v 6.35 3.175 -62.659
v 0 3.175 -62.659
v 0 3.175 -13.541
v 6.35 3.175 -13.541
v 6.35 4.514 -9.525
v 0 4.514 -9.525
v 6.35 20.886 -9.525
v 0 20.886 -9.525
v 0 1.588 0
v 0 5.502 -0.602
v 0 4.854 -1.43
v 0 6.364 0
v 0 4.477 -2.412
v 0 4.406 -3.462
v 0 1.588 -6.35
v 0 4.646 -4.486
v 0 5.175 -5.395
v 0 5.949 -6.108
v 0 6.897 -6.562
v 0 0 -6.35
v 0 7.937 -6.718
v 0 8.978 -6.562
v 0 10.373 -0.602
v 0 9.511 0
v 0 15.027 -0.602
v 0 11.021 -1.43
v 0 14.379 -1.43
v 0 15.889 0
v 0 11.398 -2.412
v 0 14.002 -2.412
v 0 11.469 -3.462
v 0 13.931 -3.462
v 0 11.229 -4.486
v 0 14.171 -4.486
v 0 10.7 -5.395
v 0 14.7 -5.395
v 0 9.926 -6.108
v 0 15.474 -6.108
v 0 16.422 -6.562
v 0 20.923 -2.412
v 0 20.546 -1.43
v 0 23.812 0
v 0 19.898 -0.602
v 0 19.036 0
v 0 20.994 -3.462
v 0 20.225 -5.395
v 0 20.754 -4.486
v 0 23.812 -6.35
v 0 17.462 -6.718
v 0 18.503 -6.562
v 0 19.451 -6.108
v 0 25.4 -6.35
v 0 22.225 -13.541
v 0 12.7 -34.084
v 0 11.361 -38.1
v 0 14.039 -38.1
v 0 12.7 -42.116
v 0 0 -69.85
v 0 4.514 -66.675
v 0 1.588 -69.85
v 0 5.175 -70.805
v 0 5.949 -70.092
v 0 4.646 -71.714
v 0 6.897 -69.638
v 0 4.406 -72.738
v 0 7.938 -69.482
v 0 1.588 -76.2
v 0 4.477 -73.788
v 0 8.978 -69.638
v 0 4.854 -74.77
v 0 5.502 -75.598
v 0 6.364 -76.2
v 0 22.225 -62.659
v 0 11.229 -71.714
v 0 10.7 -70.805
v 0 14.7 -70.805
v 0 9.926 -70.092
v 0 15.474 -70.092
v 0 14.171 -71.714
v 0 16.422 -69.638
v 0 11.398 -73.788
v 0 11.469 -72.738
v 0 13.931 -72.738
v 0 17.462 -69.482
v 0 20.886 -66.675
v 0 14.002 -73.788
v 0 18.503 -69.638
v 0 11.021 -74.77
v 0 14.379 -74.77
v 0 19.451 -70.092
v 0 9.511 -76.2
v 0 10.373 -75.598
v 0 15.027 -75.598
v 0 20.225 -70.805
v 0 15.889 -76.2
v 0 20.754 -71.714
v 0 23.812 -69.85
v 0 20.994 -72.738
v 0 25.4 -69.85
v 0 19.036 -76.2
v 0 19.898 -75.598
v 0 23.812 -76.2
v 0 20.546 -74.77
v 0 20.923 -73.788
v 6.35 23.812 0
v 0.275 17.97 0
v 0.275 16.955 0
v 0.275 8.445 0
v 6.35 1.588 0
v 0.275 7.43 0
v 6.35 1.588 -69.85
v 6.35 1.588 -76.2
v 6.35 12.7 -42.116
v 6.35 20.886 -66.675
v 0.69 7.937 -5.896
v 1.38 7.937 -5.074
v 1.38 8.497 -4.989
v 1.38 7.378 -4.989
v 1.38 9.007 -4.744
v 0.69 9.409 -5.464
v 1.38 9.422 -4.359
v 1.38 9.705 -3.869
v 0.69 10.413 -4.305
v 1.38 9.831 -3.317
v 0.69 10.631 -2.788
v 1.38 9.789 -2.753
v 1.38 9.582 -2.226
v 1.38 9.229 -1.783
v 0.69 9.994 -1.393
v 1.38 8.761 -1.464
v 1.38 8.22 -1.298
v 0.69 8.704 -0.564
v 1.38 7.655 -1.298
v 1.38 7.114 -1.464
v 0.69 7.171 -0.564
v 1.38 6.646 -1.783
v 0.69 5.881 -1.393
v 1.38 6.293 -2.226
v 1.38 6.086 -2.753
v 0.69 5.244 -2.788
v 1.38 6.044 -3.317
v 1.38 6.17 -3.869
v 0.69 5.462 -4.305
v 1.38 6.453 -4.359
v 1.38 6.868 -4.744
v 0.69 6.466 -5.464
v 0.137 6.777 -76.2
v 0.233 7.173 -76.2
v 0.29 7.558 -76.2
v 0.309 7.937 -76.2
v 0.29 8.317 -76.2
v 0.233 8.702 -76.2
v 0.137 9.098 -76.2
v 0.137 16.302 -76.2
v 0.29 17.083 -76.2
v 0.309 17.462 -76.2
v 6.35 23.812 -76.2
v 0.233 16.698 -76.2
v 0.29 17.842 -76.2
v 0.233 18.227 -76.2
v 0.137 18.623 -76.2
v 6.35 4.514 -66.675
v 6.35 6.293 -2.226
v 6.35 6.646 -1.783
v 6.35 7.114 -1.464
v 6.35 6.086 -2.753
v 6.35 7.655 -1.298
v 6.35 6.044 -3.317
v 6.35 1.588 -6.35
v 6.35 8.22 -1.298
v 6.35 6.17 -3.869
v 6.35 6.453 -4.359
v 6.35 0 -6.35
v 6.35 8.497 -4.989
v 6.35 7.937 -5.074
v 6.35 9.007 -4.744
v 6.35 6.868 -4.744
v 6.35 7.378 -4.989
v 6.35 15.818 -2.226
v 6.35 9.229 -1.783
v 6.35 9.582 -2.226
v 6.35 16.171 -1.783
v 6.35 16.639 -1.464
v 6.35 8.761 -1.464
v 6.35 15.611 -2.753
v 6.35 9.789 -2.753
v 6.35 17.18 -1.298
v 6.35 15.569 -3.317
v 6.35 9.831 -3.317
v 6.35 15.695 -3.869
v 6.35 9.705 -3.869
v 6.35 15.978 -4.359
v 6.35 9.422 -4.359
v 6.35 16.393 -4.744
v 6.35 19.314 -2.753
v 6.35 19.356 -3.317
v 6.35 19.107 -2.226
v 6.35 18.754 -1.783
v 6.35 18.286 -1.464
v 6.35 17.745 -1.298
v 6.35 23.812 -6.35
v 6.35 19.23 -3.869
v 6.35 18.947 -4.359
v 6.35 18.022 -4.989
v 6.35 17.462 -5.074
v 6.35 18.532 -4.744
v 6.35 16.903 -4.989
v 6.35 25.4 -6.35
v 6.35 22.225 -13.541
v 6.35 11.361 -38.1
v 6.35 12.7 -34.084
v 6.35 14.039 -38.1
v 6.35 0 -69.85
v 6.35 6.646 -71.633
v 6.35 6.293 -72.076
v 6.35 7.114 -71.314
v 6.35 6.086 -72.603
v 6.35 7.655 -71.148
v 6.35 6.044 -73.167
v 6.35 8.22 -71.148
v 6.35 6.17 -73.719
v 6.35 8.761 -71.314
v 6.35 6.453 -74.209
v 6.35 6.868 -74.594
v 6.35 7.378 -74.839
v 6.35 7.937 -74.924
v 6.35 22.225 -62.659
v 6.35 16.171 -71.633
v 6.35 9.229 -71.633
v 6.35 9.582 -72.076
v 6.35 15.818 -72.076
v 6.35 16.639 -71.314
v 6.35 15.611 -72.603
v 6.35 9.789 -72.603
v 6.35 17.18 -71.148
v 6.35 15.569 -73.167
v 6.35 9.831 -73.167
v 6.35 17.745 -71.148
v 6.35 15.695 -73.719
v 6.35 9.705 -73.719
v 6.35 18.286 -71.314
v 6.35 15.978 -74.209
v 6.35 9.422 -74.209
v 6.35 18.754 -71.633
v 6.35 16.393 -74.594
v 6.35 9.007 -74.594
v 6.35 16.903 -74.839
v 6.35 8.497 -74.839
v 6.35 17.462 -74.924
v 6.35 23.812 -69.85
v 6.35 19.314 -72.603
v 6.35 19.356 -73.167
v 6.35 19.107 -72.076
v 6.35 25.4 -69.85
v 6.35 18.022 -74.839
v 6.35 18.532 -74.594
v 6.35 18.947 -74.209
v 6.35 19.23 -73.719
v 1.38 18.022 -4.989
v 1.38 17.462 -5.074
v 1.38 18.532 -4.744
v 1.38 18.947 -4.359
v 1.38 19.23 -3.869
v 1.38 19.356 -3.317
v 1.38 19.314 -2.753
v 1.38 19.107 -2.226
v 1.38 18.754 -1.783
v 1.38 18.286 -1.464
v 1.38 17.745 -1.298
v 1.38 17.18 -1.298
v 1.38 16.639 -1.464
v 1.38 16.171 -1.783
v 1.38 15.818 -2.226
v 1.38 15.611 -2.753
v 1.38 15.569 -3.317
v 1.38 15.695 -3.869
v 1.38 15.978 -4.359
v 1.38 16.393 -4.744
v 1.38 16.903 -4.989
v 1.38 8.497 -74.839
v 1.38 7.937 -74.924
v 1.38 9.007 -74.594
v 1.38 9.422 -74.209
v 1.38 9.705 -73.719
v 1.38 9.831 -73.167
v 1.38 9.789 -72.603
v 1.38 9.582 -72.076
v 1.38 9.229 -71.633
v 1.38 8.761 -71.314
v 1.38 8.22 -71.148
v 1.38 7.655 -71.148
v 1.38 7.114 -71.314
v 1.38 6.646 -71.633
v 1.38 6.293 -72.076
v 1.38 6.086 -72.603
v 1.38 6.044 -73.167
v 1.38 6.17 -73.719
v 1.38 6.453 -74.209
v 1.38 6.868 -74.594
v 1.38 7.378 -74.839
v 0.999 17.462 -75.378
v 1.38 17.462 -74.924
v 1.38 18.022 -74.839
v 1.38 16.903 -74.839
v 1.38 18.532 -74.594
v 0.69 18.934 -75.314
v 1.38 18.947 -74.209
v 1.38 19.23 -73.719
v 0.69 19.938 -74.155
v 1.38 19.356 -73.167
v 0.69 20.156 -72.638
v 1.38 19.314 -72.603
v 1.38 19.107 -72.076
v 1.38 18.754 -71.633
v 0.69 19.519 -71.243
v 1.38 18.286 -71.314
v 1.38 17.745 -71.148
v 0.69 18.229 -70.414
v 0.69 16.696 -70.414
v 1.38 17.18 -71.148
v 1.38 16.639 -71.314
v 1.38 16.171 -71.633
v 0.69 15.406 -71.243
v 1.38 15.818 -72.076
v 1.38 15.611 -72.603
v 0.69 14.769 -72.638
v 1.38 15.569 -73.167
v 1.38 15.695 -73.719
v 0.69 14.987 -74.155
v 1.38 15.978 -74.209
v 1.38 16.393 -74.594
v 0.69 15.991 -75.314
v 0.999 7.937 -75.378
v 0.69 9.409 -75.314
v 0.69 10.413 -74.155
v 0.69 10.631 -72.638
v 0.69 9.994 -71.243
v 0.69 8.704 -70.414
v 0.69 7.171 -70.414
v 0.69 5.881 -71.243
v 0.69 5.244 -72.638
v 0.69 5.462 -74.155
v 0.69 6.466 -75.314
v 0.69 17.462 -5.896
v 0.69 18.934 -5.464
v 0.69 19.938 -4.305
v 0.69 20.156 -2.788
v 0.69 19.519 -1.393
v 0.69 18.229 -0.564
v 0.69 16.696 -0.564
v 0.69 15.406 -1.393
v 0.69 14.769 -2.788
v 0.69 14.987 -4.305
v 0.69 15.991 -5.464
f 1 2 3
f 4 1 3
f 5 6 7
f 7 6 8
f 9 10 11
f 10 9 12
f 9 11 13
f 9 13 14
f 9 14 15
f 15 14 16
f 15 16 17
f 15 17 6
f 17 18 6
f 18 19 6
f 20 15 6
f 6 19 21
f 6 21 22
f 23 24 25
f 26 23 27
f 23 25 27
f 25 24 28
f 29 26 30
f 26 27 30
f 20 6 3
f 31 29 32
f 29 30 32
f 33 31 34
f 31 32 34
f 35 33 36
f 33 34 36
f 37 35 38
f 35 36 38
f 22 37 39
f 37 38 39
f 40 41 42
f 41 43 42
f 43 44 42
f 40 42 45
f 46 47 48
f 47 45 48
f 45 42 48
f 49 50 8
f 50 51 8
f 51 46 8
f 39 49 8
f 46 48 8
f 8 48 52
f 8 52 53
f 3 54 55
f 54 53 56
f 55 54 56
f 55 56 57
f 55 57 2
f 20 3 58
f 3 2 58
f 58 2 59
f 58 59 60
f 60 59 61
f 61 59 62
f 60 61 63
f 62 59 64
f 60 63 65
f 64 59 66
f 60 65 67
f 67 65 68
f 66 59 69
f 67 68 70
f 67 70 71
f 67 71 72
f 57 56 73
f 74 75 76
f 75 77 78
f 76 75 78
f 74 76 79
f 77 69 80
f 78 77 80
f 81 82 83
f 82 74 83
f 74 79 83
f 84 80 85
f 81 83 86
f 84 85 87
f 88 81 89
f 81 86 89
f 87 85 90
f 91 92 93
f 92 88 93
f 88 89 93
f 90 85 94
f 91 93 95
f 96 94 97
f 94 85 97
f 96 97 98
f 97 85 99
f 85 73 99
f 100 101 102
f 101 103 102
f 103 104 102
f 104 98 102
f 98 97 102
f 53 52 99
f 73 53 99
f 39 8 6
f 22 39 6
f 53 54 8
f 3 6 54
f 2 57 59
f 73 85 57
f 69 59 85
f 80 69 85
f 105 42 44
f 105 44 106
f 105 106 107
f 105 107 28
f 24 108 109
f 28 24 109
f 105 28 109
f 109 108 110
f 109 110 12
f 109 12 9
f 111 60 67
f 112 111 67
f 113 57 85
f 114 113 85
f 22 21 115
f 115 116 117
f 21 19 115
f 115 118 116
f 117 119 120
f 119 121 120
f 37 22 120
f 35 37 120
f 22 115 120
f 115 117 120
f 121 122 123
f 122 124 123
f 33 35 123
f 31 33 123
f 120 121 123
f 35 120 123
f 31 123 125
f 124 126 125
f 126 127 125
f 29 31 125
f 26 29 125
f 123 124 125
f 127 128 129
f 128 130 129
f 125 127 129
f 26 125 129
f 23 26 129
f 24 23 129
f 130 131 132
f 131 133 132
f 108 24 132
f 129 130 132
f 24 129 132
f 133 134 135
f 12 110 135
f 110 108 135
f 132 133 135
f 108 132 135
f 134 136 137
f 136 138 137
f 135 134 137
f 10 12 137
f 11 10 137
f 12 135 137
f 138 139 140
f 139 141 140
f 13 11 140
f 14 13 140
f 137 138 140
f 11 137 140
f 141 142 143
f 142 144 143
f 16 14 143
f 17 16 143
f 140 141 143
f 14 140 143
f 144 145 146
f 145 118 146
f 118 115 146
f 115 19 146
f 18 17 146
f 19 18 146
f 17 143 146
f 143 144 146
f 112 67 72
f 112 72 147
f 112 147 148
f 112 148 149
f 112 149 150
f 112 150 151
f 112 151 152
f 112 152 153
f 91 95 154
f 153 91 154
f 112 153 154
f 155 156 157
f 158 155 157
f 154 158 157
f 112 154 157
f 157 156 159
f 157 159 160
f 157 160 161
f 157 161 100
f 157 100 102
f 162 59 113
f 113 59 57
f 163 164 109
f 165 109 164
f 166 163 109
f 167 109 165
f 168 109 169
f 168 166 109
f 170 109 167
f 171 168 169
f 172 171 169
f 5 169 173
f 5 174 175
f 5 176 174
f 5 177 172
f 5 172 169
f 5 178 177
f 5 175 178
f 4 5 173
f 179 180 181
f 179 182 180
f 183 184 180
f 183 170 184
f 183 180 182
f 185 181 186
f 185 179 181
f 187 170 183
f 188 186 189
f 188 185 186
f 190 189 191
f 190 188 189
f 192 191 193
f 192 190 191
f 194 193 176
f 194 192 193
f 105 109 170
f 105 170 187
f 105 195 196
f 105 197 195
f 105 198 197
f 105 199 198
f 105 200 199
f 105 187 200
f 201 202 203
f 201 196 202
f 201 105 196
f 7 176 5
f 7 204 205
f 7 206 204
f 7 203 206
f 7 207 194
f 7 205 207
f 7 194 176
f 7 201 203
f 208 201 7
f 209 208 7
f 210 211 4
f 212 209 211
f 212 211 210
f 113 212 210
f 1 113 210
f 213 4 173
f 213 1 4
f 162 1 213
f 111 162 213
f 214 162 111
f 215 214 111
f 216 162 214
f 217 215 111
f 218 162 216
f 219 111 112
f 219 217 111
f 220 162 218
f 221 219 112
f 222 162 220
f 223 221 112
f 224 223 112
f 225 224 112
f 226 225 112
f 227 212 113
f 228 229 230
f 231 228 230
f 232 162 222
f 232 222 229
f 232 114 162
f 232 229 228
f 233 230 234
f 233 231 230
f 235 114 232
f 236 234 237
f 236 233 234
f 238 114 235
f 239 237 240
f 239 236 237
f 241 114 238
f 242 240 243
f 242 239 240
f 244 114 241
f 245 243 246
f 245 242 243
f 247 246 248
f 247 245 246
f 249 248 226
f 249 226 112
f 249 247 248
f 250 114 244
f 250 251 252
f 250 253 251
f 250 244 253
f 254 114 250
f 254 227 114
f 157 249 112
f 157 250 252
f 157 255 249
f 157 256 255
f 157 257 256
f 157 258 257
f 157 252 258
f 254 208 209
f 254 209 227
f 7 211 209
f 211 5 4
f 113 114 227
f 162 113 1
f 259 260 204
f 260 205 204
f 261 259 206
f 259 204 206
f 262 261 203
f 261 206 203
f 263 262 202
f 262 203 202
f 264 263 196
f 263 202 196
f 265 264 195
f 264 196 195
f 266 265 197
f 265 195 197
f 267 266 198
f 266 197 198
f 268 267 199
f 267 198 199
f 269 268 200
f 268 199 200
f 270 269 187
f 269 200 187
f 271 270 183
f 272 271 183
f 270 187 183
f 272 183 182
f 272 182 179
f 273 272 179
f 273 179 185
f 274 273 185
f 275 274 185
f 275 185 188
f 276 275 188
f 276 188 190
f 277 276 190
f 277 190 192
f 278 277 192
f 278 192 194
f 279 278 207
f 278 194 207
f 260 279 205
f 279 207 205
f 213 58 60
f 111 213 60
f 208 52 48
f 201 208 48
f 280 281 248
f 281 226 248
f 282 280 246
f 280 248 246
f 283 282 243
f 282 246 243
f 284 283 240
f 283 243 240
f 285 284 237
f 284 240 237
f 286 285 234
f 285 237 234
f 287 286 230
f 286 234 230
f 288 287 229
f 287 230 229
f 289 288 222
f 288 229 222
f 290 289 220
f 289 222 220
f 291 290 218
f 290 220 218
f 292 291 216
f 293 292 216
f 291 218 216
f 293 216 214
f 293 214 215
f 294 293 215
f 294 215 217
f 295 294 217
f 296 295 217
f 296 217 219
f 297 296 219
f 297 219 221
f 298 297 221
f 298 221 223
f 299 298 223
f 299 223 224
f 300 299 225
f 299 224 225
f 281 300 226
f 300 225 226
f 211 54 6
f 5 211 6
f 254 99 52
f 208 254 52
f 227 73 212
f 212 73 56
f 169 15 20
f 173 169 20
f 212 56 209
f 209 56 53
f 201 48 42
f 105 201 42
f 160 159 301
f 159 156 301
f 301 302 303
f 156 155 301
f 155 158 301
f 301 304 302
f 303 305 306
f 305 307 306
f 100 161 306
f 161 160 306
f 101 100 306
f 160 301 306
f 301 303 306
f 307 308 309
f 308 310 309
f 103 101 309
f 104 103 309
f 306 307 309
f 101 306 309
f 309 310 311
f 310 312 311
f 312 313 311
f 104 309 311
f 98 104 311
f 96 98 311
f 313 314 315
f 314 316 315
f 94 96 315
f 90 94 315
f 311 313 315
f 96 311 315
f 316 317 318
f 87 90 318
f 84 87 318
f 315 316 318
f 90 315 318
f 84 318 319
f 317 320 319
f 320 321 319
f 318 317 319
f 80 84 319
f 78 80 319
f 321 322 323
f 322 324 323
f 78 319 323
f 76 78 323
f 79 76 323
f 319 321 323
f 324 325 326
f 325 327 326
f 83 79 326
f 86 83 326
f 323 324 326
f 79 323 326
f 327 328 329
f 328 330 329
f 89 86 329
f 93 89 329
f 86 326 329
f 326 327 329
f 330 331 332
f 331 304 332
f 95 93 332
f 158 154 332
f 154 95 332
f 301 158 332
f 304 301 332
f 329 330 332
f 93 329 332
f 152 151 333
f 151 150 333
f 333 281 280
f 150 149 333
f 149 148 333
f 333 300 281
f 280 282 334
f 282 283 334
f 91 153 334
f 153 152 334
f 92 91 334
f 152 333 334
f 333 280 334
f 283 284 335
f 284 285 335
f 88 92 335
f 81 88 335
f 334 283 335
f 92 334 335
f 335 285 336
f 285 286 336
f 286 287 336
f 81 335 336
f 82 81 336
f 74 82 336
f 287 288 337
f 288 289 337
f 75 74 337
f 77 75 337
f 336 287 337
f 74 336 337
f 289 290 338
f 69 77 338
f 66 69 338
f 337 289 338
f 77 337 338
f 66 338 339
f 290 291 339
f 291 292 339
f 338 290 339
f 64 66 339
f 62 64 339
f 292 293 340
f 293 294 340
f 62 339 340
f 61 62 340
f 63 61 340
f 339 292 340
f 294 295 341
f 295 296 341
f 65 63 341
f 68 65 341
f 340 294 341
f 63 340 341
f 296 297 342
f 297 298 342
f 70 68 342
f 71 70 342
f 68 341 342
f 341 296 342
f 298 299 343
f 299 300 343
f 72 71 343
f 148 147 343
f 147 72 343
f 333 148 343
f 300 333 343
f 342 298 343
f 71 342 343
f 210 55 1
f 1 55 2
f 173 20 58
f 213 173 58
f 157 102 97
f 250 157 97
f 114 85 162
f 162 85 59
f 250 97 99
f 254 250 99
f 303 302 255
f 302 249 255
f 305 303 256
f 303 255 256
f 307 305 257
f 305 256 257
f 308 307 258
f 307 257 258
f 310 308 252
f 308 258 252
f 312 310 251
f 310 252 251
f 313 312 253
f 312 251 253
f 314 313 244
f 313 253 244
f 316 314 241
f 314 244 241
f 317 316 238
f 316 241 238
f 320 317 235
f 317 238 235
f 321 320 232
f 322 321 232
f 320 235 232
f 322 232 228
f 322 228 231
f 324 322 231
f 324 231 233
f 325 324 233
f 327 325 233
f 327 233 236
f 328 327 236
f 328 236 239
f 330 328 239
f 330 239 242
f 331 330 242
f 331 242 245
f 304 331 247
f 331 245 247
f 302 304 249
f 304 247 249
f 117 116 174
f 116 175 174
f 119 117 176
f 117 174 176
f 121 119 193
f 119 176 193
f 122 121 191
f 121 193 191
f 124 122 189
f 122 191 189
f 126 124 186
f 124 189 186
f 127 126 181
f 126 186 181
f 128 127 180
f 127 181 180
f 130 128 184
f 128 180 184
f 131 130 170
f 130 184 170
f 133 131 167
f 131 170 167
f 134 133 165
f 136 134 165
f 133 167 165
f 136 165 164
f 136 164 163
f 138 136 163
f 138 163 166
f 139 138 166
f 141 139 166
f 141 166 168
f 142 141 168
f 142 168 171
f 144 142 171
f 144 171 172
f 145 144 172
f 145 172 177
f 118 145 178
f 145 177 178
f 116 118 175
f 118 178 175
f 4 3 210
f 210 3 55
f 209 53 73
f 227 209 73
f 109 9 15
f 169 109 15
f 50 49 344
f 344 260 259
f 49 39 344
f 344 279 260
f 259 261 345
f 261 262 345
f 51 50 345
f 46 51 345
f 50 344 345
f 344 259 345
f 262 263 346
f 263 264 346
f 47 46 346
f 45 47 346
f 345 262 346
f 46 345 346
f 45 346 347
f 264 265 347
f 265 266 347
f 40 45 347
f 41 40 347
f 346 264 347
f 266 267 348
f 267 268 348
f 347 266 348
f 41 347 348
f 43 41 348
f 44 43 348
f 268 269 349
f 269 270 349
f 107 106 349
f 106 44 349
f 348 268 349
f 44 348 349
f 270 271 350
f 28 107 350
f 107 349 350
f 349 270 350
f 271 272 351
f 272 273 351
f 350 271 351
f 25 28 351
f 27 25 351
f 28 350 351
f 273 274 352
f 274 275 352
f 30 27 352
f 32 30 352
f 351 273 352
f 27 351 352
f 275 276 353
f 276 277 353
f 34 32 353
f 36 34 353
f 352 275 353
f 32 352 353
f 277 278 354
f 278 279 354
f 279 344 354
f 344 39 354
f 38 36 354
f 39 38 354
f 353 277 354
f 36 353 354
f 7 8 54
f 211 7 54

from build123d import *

# Parameters (mm, degrees)
BOSS_EXTRUDE1_DEPTH                               = 6.35
CSK_FOR_6_FLAT_HEAD_MACHINE_SCREW_100_D           = 3.7973
CSK_FOR_6_FLAT_HEAD_MACHINE_SCREW_100_CSINK_D     = 7.0866
CSK_FOR_6_FLAT_HEAD_MACHINE_SCREW_100_CSINK_ANGLE = 100
CUT_EXTRUDE1_DEPTH                                = 81.572467382


with BuildPart() as part:
    # Sketch1 → Boss-Extrude1 (new body)
    with BuildSketch(Plane(origin=(0, 0, 0), x_dir=(0, 0, -1), z_dir=(1, 0, 0))):
        Polygon((69.85, 25.4), (38.1, 25.4), (38.1, 0), (69.85, 0), (69.85, 1.5875), (76.2, 1.5875), (76.2, 23.8125), (69.85, 23.8125), align=None)
        Polygon((38.1, 0), (38.1, 25.4), (6.35, 25.4), (6.35, 23.8125), (0, 23.8125), (0, 1.5875), (6.35, 1.5875), (6.35, 0), align=None)
    extrude(amount=BOSS_EXTRUDE1_DEPTH)

    # CSK for #6 Flat Head Machine Screw (100)1 (through all)
    with Locations(Plane.ZY):
        with Locations((-73.025, 17.4625), (-73.025, 7.9375), (-3.175, 17.4625), (-3.175, 7.9375)):
            CounterSinkHole(CSK_FOR_6_FLAT_HEAD_MACHINE_SCREW_100_D / 2, CSK_FOR_6_FLAT_HEAD_MACHINE_SCREW_100_CSINK_D / 2, counter_sink_angle=CSK_FOR_6_FLAT_HEAD_MACHINE_SCREW_100_CSINK_ANGLE)

    # Sketch4 → Cut-Extrude1 (cut, through all)
    with BuildSketch(Plane.ZY):
        Polygon((-42.116092628, 12.7), (-66.675, 20.886302457), (-66.675, 4.513697543), align=None)
        Polygon((-13.541092628, 22.225), (-62.658907372, 22.225), (-38.1, 14.038697543), align=None)
        Polygon((-9.525, 20.886302457), (-34.083907372, 12.7), (-9.525, 4.513697543), align=None)
        Polygon((-13.541092628, 3.175), (-38.1, 11.361302457), (-62.658907372, 3.175), align=None)
    extrude(amount=-CUT_EXTRUDE1_DEPTH, mode=Mode.SUBTRACT)


solid = part.part
